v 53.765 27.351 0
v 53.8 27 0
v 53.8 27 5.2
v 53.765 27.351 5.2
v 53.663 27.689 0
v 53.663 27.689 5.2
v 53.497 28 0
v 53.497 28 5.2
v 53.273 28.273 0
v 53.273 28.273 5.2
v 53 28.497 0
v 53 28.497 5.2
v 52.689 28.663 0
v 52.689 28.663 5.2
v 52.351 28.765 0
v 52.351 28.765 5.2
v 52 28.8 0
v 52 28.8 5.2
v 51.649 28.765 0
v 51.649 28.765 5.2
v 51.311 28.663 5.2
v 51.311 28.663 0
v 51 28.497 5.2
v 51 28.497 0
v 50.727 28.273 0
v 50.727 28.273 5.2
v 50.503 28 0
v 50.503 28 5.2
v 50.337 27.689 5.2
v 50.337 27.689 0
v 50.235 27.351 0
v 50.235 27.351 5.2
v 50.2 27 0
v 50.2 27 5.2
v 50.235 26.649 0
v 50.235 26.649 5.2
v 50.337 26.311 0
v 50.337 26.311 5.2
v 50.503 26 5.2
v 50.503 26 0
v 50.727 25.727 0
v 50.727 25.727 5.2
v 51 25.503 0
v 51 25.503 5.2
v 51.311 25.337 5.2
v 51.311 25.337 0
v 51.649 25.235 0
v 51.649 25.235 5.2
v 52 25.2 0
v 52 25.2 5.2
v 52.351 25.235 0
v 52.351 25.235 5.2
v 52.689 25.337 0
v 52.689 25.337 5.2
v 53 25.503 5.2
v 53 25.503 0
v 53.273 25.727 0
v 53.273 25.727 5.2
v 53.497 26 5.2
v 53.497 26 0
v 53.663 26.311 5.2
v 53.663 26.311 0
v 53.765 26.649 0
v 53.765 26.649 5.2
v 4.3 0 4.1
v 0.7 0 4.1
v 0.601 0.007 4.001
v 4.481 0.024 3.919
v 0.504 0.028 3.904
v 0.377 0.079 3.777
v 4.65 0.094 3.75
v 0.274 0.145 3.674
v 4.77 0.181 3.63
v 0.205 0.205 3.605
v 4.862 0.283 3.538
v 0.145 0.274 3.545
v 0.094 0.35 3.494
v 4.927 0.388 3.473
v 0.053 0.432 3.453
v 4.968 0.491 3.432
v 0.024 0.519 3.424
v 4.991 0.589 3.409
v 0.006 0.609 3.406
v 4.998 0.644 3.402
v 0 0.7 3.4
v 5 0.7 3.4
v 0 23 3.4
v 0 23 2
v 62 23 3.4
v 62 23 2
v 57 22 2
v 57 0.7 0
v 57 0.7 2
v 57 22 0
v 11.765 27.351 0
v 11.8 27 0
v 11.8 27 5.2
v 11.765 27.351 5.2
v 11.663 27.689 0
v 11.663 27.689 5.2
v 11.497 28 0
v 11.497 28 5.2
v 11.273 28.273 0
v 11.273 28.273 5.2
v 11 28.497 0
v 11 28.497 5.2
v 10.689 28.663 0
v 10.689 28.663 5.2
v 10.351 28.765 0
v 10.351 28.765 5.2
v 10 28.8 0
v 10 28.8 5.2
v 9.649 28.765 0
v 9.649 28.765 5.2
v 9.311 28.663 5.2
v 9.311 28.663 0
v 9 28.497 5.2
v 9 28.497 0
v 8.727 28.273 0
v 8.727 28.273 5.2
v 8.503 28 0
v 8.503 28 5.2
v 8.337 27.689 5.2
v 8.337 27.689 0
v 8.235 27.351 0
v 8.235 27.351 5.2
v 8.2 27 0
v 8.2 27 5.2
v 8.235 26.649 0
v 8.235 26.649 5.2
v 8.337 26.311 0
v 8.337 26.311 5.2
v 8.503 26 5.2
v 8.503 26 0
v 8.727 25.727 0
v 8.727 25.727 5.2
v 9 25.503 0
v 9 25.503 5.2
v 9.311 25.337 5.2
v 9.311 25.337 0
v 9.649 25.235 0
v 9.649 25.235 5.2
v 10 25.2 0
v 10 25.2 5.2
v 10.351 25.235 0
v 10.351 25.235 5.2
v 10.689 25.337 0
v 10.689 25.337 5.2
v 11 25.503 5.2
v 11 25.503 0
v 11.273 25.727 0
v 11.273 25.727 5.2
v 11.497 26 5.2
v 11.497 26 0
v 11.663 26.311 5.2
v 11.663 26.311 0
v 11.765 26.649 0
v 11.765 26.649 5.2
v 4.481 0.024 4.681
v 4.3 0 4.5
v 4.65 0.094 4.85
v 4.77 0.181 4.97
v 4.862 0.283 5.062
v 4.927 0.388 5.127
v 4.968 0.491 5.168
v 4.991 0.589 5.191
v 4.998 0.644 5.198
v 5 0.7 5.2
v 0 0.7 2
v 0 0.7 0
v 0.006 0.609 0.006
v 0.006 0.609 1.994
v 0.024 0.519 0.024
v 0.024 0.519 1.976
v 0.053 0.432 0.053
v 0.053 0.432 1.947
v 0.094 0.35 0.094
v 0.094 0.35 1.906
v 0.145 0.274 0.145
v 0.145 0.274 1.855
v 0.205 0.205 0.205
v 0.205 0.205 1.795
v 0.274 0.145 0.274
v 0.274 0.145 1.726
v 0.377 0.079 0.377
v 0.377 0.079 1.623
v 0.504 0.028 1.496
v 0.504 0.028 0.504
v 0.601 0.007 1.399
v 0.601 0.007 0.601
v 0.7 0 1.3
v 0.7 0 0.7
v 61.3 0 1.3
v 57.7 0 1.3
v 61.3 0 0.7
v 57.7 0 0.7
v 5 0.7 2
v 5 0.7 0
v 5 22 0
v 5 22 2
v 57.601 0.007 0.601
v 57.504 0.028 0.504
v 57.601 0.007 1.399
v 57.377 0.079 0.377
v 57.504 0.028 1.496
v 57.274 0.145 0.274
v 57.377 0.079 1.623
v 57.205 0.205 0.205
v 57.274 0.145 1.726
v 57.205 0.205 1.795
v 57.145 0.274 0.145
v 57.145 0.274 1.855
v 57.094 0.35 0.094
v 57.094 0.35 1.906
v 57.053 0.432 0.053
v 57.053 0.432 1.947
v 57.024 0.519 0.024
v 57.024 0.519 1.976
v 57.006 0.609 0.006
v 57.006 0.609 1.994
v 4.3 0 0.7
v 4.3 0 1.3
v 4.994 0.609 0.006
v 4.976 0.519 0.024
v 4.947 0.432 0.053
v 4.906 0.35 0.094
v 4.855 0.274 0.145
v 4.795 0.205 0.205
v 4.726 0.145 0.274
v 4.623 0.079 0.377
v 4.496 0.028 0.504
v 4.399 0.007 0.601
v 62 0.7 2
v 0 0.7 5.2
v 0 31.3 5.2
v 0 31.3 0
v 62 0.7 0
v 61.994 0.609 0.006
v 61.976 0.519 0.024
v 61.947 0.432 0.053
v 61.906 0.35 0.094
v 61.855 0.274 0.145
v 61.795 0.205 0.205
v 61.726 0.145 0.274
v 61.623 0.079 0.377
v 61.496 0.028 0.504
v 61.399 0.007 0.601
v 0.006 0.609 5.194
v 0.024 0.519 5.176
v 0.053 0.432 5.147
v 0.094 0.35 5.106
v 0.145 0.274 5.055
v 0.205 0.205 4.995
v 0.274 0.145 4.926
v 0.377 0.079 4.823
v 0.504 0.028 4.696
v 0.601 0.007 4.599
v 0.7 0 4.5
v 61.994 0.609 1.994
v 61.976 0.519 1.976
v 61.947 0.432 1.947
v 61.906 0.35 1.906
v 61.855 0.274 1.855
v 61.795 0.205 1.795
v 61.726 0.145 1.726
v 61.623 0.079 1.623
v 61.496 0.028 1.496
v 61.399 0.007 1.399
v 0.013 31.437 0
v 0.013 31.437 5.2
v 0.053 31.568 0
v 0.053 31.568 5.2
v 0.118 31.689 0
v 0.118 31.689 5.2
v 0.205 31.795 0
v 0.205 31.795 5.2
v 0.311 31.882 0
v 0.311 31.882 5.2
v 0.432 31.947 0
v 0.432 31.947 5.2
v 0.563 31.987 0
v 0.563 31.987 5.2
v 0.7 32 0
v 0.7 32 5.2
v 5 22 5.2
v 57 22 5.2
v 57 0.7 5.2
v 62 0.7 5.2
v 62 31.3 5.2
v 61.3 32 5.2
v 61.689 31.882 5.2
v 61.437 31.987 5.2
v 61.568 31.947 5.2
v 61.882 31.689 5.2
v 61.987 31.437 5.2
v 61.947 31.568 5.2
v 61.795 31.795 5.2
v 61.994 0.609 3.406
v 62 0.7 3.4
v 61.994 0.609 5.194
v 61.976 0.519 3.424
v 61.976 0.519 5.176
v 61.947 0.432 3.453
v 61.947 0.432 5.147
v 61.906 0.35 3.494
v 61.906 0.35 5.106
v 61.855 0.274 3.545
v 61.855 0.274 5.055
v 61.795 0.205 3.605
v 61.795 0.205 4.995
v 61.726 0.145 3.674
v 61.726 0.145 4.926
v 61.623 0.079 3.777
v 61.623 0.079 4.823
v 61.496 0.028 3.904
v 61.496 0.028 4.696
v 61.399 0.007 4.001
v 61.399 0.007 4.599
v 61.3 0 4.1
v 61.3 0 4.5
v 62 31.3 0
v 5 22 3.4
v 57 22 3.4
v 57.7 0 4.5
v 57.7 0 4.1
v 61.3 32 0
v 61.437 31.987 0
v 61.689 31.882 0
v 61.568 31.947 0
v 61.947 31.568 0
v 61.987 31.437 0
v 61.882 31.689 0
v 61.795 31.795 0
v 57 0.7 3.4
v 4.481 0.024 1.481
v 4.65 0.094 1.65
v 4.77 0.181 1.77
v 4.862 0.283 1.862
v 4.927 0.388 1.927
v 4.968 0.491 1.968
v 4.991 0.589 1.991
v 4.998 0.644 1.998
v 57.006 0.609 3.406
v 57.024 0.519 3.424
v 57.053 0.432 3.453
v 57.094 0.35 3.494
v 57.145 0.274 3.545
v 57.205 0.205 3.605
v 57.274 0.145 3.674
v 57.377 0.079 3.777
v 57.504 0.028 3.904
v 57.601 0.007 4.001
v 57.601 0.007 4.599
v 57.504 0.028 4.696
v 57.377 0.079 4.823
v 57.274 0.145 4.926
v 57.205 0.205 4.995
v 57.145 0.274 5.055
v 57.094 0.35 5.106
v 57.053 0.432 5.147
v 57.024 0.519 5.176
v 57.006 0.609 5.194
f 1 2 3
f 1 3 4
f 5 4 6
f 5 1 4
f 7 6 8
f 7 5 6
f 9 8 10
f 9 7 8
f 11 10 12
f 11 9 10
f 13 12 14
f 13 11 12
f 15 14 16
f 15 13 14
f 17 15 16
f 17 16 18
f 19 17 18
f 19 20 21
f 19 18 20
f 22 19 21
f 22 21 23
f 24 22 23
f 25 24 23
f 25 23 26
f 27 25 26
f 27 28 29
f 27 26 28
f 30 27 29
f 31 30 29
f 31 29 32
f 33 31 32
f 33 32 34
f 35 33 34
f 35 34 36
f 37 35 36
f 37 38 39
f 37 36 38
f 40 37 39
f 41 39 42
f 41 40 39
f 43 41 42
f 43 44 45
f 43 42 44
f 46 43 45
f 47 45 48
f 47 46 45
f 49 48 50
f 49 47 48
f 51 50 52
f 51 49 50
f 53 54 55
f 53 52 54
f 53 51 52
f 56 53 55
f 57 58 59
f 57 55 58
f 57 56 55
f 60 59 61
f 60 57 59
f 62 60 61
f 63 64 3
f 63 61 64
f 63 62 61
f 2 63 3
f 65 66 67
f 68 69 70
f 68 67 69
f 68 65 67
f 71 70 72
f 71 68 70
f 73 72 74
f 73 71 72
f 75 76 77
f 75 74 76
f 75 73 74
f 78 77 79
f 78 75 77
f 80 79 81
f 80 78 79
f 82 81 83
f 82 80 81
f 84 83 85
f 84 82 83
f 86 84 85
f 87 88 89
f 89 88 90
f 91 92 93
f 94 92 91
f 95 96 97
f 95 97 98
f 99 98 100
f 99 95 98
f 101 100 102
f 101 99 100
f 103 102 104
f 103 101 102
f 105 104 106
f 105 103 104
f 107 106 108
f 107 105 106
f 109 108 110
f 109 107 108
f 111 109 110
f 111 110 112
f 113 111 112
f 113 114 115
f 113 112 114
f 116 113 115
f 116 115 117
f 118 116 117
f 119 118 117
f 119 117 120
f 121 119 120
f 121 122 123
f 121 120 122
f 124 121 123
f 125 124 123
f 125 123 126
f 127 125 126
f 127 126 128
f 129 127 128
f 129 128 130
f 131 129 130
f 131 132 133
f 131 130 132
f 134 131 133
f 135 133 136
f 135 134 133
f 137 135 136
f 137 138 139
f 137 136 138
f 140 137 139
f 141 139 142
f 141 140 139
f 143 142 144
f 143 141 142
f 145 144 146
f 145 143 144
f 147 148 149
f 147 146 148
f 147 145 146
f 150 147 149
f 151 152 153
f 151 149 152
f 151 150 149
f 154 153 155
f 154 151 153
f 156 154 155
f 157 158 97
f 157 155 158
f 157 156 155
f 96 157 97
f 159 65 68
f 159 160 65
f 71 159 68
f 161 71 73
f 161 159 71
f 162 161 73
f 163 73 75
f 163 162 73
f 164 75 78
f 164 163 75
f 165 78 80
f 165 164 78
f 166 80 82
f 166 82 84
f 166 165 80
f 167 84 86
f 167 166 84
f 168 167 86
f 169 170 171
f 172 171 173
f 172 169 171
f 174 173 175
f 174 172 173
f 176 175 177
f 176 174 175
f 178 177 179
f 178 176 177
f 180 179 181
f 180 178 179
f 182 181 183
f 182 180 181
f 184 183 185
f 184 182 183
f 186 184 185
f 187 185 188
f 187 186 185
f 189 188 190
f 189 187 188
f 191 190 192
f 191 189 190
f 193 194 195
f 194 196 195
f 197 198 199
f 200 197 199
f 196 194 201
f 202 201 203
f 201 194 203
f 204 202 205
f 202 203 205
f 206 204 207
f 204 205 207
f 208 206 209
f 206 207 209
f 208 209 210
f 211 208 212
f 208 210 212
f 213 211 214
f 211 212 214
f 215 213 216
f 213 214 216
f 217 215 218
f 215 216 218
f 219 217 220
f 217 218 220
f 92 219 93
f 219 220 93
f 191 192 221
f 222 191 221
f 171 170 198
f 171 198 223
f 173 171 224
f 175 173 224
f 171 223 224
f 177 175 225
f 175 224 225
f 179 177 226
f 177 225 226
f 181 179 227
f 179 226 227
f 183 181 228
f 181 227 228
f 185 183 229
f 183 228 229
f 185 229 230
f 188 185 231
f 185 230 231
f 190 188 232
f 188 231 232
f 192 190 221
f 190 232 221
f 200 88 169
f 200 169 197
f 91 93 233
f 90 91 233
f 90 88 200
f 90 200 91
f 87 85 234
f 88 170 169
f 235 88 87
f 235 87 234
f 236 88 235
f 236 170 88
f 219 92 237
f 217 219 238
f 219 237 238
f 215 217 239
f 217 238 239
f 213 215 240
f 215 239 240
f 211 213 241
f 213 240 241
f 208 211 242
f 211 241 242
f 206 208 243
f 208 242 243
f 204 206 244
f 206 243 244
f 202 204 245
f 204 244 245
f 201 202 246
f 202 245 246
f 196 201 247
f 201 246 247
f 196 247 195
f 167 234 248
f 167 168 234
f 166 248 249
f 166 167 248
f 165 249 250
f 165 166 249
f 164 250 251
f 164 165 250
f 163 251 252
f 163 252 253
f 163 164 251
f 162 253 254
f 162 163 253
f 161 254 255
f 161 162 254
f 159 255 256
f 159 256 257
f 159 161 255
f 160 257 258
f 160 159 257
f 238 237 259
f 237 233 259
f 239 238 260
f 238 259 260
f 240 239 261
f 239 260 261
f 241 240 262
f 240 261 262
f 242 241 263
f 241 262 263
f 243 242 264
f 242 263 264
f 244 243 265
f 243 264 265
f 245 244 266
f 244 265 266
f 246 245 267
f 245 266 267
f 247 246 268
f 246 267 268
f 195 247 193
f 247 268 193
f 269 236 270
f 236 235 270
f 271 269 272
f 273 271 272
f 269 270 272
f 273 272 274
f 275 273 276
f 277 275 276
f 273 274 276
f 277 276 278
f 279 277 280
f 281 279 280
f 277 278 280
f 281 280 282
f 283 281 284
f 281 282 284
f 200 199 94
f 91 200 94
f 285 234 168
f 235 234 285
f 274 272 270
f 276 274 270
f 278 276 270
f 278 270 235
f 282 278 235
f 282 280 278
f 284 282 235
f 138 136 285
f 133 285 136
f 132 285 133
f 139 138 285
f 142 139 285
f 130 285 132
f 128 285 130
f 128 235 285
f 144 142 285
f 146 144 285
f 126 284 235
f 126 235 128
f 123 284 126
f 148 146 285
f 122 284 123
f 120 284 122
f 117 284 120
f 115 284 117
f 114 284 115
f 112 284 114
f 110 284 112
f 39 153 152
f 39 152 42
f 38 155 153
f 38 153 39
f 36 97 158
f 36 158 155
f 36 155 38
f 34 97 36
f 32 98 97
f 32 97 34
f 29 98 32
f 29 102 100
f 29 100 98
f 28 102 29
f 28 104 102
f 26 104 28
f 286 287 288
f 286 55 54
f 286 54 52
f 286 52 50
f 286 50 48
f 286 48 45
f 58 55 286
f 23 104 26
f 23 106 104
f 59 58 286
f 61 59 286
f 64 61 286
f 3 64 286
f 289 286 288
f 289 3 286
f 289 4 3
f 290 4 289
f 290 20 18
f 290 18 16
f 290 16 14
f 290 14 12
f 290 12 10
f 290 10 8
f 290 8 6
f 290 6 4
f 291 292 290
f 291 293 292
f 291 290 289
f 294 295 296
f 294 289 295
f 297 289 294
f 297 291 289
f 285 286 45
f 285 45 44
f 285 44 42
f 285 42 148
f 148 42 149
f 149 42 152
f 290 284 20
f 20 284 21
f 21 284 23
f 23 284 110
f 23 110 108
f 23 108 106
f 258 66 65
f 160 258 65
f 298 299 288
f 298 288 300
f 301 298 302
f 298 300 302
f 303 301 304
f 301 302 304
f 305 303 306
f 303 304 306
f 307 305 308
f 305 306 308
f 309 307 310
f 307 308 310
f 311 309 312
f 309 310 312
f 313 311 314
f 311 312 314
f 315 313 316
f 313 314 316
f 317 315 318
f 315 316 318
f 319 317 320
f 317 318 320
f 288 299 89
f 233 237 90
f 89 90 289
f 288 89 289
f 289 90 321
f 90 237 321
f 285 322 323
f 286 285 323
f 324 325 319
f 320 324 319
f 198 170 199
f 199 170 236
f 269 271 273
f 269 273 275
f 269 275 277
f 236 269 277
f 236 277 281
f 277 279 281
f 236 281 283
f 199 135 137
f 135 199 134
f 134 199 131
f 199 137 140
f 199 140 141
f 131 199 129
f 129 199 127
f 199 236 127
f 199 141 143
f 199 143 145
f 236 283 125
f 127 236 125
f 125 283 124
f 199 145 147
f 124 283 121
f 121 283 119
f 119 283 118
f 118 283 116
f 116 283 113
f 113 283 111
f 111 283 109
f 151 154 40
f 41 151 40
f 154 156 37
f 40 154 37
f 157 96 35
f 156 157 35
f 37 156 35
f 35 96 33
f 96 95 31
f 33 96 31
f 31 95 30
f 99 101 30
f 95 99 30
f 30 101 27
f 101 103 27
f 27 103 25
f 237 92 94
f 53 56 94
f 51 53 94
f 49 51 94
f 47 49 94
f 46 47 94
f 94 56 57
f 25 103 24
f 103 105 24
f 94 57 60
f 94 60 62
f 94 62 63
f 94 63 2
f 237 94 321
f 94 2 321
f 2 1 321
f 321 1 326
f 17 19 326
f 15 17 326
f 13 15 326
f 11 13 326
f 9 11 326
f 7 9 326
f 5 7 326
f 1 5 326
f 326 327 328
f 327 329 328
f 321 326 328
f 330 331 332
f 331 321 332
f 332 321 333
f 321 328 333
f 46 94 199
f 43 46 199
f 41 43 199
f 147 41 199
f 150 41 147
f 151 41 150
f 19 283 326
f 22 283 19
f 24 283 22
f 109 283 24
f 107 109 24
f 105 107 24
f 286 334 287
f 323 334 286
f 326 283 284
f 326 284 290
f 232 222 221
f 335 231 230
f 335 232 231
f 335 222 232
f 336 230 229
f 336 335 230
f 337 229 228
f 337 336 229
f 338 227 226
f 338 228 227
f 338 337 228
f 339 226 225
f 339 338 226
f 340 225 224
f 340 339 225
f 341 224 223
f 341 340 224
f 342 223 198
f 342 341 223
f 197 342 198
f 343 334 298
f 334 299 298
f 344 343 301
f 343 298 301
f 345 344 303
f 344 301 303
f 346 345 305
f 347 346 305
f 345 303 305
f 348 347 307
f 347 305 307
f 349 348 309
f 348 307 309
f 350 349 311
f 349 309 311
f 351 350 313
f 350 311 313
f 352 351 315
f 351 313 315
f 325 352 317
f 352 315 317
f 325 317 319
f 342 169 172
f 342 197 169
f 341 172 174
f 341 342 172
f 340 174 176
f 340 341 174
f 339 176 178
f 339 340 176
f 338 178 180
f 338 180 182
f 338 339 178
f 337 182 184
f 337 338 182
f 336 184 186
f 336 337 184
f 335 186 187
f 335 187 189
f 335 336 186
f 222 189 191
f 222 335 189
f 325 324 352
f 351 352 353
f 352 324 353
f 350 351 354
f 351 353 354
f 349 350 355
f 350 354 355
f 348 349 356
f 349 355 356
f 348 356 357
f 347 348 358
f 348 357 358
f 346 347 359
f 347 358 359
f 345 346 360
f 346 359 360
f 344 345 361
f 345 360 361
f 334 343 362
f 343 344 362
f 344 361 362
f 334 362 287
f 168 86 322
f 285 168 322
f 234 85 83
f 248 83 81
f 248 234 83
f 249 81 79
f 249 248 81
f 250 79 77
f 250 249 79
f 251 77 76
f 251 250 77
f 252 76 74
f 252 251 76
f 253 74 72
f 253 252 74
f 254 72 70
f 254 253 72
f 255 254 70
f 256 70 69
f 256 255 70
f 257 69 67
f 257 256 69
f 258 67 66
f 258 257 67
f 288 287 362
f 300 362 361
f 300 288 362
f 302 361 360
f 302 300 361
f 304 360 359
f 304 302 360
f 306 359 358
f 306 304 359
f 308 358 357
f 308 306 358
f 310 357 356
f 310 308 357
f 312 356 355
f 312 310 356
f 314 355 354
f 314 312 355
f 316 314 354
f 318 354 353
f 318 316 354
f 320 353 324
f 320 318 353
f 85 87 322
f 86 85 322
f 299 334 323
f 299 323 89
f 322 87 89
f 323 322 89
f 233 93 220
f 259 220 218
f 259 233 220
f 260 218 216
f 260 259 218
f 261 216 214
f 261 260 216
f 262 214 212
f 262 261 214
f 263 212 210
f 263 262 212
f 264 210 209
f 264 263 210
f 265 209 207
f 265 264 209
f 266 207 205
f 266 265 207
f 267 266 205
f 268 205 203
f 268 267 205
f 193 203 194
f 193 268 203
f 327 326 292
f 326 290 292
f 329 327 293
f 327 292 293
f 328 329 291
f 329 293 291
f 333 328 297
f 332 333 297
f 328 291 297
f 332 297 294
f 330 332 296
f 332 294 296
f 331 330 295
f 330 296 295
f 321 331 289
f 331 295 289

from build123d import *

# Parameters (mm, degrees)
CYLINDER051_R       = 1.8
CYLINDER051_DEPTH   = 20
ARRAY001022_X_COUNT = 2
ARRAY001022_X_PITCH = 42
BOX022_W            = 122
BOX022_H            = 23
BOX022_DEPTH        = 1.4
BOX020_W            = 52
BOX020_H            = 22
BOX020_DEPTH        = 20
BOX019_W            = 62
BOX019_H            = 32
BOX019_DEPTH        = 5.2
FILLET010_R         = 0.7


with BuildPart() as microslider_bolt_hole_array:
    # Cylinder051 → Cylinder051 (new body)
    with BuildSketch(Plane(origin=(10, 27, -5), x_dir=(1, 0, 0), z_dir=(0, 0, 1))):
        Circle(CYLINDER051_R)
    extrude(amount=CYLINDER051_DEPTH)

    # Array001022 X: microslider bolt hole array ×2


with BuildPart() as microslider_bolt_hole_array_1:
    add(microslider_bolt_hole_array.part)
    with Locations(*[(i * ARRAY001022_X_PITCH, 0, 0) for i in range(1, ARRAY001022_X_COUNT)]):
        add(microslider_bolt_hole_array.part)


with BuildPart() as microslider_holder_height_centre:
    # Box022 → Box022 (new body)
    with BuildSketch(Plane(origin=(-25, 0, 2), x_dir=(1, 0, 0), z_dir=(0, 0, 1))):
        with Locations((61, 11.5)):
            Rectangle(BOX022_W, BOX022_H)
    extrude(amount=BOX022_DEPTH)


with BuildPart() as microslider_cut_fusion:
    # Box020 → Box020 (new body)
    with BuildSketch(Plane(origin=(5, 0, -10), x_dir=(1, 0, 0), z_dir=(0, 0, 1))):
        with Locations((26, 11)):
            Rectangle(BOX020_W, BOX020_H)
    extrude(amount=BOX020_DEPTH)

    # Fusion033: union microslider holder height centre
    add(microslider_holder_height_centre.part)


with BuildPart() as microslide_holder_bolted_cut:
    # Box019 → Box019 (new body)
    with BuildSketch(Plane.XY):
        with Locations((31, 16)):
            Rectangle(BOX019_W, BOX019_H)
    extrude(amount=BOX019_DEPTH)

    # Cut019: cut microslider cut fusion
    add(microslider_cut_fusion.part, mode=Mode.SUBTRACT)

    # Fillet010
    fillet010_edges = [microslide_holder_bolted_cut.edges().sort_by_distance(p)[0] for p in [
        (0, 0, 1),
        (0, 0, 4.3),
        (0, 32, 2.6),
        (2.5, 0, 0),
        (5, 0, 1),
        (2.5, 0, 2),
        (59.5, 0, 2),
        (59.5, 0, 3.4),
        (2.5, 0, 3.4),
        (5, 0, 4.3),
        (2.5, 0, 5.2),
        (59.5, 0, 5.2),
        (62, 32, 2.6),
        (59.5, 0, 0),
        (62, 0, 1),
        (62, 0, 4.3),
        (57, 0, 1),
        (57, 0, 4.3),
    ]]
    fillet(fillet010_edges, radius=FILLET010_R)

    # Cut020: cut microslider bolt hole array
    add(microslider_bolt_hole_array_1.part, mode=Mode.SUBTRACT)


solid = microslide_holder_bolted_cut.part
